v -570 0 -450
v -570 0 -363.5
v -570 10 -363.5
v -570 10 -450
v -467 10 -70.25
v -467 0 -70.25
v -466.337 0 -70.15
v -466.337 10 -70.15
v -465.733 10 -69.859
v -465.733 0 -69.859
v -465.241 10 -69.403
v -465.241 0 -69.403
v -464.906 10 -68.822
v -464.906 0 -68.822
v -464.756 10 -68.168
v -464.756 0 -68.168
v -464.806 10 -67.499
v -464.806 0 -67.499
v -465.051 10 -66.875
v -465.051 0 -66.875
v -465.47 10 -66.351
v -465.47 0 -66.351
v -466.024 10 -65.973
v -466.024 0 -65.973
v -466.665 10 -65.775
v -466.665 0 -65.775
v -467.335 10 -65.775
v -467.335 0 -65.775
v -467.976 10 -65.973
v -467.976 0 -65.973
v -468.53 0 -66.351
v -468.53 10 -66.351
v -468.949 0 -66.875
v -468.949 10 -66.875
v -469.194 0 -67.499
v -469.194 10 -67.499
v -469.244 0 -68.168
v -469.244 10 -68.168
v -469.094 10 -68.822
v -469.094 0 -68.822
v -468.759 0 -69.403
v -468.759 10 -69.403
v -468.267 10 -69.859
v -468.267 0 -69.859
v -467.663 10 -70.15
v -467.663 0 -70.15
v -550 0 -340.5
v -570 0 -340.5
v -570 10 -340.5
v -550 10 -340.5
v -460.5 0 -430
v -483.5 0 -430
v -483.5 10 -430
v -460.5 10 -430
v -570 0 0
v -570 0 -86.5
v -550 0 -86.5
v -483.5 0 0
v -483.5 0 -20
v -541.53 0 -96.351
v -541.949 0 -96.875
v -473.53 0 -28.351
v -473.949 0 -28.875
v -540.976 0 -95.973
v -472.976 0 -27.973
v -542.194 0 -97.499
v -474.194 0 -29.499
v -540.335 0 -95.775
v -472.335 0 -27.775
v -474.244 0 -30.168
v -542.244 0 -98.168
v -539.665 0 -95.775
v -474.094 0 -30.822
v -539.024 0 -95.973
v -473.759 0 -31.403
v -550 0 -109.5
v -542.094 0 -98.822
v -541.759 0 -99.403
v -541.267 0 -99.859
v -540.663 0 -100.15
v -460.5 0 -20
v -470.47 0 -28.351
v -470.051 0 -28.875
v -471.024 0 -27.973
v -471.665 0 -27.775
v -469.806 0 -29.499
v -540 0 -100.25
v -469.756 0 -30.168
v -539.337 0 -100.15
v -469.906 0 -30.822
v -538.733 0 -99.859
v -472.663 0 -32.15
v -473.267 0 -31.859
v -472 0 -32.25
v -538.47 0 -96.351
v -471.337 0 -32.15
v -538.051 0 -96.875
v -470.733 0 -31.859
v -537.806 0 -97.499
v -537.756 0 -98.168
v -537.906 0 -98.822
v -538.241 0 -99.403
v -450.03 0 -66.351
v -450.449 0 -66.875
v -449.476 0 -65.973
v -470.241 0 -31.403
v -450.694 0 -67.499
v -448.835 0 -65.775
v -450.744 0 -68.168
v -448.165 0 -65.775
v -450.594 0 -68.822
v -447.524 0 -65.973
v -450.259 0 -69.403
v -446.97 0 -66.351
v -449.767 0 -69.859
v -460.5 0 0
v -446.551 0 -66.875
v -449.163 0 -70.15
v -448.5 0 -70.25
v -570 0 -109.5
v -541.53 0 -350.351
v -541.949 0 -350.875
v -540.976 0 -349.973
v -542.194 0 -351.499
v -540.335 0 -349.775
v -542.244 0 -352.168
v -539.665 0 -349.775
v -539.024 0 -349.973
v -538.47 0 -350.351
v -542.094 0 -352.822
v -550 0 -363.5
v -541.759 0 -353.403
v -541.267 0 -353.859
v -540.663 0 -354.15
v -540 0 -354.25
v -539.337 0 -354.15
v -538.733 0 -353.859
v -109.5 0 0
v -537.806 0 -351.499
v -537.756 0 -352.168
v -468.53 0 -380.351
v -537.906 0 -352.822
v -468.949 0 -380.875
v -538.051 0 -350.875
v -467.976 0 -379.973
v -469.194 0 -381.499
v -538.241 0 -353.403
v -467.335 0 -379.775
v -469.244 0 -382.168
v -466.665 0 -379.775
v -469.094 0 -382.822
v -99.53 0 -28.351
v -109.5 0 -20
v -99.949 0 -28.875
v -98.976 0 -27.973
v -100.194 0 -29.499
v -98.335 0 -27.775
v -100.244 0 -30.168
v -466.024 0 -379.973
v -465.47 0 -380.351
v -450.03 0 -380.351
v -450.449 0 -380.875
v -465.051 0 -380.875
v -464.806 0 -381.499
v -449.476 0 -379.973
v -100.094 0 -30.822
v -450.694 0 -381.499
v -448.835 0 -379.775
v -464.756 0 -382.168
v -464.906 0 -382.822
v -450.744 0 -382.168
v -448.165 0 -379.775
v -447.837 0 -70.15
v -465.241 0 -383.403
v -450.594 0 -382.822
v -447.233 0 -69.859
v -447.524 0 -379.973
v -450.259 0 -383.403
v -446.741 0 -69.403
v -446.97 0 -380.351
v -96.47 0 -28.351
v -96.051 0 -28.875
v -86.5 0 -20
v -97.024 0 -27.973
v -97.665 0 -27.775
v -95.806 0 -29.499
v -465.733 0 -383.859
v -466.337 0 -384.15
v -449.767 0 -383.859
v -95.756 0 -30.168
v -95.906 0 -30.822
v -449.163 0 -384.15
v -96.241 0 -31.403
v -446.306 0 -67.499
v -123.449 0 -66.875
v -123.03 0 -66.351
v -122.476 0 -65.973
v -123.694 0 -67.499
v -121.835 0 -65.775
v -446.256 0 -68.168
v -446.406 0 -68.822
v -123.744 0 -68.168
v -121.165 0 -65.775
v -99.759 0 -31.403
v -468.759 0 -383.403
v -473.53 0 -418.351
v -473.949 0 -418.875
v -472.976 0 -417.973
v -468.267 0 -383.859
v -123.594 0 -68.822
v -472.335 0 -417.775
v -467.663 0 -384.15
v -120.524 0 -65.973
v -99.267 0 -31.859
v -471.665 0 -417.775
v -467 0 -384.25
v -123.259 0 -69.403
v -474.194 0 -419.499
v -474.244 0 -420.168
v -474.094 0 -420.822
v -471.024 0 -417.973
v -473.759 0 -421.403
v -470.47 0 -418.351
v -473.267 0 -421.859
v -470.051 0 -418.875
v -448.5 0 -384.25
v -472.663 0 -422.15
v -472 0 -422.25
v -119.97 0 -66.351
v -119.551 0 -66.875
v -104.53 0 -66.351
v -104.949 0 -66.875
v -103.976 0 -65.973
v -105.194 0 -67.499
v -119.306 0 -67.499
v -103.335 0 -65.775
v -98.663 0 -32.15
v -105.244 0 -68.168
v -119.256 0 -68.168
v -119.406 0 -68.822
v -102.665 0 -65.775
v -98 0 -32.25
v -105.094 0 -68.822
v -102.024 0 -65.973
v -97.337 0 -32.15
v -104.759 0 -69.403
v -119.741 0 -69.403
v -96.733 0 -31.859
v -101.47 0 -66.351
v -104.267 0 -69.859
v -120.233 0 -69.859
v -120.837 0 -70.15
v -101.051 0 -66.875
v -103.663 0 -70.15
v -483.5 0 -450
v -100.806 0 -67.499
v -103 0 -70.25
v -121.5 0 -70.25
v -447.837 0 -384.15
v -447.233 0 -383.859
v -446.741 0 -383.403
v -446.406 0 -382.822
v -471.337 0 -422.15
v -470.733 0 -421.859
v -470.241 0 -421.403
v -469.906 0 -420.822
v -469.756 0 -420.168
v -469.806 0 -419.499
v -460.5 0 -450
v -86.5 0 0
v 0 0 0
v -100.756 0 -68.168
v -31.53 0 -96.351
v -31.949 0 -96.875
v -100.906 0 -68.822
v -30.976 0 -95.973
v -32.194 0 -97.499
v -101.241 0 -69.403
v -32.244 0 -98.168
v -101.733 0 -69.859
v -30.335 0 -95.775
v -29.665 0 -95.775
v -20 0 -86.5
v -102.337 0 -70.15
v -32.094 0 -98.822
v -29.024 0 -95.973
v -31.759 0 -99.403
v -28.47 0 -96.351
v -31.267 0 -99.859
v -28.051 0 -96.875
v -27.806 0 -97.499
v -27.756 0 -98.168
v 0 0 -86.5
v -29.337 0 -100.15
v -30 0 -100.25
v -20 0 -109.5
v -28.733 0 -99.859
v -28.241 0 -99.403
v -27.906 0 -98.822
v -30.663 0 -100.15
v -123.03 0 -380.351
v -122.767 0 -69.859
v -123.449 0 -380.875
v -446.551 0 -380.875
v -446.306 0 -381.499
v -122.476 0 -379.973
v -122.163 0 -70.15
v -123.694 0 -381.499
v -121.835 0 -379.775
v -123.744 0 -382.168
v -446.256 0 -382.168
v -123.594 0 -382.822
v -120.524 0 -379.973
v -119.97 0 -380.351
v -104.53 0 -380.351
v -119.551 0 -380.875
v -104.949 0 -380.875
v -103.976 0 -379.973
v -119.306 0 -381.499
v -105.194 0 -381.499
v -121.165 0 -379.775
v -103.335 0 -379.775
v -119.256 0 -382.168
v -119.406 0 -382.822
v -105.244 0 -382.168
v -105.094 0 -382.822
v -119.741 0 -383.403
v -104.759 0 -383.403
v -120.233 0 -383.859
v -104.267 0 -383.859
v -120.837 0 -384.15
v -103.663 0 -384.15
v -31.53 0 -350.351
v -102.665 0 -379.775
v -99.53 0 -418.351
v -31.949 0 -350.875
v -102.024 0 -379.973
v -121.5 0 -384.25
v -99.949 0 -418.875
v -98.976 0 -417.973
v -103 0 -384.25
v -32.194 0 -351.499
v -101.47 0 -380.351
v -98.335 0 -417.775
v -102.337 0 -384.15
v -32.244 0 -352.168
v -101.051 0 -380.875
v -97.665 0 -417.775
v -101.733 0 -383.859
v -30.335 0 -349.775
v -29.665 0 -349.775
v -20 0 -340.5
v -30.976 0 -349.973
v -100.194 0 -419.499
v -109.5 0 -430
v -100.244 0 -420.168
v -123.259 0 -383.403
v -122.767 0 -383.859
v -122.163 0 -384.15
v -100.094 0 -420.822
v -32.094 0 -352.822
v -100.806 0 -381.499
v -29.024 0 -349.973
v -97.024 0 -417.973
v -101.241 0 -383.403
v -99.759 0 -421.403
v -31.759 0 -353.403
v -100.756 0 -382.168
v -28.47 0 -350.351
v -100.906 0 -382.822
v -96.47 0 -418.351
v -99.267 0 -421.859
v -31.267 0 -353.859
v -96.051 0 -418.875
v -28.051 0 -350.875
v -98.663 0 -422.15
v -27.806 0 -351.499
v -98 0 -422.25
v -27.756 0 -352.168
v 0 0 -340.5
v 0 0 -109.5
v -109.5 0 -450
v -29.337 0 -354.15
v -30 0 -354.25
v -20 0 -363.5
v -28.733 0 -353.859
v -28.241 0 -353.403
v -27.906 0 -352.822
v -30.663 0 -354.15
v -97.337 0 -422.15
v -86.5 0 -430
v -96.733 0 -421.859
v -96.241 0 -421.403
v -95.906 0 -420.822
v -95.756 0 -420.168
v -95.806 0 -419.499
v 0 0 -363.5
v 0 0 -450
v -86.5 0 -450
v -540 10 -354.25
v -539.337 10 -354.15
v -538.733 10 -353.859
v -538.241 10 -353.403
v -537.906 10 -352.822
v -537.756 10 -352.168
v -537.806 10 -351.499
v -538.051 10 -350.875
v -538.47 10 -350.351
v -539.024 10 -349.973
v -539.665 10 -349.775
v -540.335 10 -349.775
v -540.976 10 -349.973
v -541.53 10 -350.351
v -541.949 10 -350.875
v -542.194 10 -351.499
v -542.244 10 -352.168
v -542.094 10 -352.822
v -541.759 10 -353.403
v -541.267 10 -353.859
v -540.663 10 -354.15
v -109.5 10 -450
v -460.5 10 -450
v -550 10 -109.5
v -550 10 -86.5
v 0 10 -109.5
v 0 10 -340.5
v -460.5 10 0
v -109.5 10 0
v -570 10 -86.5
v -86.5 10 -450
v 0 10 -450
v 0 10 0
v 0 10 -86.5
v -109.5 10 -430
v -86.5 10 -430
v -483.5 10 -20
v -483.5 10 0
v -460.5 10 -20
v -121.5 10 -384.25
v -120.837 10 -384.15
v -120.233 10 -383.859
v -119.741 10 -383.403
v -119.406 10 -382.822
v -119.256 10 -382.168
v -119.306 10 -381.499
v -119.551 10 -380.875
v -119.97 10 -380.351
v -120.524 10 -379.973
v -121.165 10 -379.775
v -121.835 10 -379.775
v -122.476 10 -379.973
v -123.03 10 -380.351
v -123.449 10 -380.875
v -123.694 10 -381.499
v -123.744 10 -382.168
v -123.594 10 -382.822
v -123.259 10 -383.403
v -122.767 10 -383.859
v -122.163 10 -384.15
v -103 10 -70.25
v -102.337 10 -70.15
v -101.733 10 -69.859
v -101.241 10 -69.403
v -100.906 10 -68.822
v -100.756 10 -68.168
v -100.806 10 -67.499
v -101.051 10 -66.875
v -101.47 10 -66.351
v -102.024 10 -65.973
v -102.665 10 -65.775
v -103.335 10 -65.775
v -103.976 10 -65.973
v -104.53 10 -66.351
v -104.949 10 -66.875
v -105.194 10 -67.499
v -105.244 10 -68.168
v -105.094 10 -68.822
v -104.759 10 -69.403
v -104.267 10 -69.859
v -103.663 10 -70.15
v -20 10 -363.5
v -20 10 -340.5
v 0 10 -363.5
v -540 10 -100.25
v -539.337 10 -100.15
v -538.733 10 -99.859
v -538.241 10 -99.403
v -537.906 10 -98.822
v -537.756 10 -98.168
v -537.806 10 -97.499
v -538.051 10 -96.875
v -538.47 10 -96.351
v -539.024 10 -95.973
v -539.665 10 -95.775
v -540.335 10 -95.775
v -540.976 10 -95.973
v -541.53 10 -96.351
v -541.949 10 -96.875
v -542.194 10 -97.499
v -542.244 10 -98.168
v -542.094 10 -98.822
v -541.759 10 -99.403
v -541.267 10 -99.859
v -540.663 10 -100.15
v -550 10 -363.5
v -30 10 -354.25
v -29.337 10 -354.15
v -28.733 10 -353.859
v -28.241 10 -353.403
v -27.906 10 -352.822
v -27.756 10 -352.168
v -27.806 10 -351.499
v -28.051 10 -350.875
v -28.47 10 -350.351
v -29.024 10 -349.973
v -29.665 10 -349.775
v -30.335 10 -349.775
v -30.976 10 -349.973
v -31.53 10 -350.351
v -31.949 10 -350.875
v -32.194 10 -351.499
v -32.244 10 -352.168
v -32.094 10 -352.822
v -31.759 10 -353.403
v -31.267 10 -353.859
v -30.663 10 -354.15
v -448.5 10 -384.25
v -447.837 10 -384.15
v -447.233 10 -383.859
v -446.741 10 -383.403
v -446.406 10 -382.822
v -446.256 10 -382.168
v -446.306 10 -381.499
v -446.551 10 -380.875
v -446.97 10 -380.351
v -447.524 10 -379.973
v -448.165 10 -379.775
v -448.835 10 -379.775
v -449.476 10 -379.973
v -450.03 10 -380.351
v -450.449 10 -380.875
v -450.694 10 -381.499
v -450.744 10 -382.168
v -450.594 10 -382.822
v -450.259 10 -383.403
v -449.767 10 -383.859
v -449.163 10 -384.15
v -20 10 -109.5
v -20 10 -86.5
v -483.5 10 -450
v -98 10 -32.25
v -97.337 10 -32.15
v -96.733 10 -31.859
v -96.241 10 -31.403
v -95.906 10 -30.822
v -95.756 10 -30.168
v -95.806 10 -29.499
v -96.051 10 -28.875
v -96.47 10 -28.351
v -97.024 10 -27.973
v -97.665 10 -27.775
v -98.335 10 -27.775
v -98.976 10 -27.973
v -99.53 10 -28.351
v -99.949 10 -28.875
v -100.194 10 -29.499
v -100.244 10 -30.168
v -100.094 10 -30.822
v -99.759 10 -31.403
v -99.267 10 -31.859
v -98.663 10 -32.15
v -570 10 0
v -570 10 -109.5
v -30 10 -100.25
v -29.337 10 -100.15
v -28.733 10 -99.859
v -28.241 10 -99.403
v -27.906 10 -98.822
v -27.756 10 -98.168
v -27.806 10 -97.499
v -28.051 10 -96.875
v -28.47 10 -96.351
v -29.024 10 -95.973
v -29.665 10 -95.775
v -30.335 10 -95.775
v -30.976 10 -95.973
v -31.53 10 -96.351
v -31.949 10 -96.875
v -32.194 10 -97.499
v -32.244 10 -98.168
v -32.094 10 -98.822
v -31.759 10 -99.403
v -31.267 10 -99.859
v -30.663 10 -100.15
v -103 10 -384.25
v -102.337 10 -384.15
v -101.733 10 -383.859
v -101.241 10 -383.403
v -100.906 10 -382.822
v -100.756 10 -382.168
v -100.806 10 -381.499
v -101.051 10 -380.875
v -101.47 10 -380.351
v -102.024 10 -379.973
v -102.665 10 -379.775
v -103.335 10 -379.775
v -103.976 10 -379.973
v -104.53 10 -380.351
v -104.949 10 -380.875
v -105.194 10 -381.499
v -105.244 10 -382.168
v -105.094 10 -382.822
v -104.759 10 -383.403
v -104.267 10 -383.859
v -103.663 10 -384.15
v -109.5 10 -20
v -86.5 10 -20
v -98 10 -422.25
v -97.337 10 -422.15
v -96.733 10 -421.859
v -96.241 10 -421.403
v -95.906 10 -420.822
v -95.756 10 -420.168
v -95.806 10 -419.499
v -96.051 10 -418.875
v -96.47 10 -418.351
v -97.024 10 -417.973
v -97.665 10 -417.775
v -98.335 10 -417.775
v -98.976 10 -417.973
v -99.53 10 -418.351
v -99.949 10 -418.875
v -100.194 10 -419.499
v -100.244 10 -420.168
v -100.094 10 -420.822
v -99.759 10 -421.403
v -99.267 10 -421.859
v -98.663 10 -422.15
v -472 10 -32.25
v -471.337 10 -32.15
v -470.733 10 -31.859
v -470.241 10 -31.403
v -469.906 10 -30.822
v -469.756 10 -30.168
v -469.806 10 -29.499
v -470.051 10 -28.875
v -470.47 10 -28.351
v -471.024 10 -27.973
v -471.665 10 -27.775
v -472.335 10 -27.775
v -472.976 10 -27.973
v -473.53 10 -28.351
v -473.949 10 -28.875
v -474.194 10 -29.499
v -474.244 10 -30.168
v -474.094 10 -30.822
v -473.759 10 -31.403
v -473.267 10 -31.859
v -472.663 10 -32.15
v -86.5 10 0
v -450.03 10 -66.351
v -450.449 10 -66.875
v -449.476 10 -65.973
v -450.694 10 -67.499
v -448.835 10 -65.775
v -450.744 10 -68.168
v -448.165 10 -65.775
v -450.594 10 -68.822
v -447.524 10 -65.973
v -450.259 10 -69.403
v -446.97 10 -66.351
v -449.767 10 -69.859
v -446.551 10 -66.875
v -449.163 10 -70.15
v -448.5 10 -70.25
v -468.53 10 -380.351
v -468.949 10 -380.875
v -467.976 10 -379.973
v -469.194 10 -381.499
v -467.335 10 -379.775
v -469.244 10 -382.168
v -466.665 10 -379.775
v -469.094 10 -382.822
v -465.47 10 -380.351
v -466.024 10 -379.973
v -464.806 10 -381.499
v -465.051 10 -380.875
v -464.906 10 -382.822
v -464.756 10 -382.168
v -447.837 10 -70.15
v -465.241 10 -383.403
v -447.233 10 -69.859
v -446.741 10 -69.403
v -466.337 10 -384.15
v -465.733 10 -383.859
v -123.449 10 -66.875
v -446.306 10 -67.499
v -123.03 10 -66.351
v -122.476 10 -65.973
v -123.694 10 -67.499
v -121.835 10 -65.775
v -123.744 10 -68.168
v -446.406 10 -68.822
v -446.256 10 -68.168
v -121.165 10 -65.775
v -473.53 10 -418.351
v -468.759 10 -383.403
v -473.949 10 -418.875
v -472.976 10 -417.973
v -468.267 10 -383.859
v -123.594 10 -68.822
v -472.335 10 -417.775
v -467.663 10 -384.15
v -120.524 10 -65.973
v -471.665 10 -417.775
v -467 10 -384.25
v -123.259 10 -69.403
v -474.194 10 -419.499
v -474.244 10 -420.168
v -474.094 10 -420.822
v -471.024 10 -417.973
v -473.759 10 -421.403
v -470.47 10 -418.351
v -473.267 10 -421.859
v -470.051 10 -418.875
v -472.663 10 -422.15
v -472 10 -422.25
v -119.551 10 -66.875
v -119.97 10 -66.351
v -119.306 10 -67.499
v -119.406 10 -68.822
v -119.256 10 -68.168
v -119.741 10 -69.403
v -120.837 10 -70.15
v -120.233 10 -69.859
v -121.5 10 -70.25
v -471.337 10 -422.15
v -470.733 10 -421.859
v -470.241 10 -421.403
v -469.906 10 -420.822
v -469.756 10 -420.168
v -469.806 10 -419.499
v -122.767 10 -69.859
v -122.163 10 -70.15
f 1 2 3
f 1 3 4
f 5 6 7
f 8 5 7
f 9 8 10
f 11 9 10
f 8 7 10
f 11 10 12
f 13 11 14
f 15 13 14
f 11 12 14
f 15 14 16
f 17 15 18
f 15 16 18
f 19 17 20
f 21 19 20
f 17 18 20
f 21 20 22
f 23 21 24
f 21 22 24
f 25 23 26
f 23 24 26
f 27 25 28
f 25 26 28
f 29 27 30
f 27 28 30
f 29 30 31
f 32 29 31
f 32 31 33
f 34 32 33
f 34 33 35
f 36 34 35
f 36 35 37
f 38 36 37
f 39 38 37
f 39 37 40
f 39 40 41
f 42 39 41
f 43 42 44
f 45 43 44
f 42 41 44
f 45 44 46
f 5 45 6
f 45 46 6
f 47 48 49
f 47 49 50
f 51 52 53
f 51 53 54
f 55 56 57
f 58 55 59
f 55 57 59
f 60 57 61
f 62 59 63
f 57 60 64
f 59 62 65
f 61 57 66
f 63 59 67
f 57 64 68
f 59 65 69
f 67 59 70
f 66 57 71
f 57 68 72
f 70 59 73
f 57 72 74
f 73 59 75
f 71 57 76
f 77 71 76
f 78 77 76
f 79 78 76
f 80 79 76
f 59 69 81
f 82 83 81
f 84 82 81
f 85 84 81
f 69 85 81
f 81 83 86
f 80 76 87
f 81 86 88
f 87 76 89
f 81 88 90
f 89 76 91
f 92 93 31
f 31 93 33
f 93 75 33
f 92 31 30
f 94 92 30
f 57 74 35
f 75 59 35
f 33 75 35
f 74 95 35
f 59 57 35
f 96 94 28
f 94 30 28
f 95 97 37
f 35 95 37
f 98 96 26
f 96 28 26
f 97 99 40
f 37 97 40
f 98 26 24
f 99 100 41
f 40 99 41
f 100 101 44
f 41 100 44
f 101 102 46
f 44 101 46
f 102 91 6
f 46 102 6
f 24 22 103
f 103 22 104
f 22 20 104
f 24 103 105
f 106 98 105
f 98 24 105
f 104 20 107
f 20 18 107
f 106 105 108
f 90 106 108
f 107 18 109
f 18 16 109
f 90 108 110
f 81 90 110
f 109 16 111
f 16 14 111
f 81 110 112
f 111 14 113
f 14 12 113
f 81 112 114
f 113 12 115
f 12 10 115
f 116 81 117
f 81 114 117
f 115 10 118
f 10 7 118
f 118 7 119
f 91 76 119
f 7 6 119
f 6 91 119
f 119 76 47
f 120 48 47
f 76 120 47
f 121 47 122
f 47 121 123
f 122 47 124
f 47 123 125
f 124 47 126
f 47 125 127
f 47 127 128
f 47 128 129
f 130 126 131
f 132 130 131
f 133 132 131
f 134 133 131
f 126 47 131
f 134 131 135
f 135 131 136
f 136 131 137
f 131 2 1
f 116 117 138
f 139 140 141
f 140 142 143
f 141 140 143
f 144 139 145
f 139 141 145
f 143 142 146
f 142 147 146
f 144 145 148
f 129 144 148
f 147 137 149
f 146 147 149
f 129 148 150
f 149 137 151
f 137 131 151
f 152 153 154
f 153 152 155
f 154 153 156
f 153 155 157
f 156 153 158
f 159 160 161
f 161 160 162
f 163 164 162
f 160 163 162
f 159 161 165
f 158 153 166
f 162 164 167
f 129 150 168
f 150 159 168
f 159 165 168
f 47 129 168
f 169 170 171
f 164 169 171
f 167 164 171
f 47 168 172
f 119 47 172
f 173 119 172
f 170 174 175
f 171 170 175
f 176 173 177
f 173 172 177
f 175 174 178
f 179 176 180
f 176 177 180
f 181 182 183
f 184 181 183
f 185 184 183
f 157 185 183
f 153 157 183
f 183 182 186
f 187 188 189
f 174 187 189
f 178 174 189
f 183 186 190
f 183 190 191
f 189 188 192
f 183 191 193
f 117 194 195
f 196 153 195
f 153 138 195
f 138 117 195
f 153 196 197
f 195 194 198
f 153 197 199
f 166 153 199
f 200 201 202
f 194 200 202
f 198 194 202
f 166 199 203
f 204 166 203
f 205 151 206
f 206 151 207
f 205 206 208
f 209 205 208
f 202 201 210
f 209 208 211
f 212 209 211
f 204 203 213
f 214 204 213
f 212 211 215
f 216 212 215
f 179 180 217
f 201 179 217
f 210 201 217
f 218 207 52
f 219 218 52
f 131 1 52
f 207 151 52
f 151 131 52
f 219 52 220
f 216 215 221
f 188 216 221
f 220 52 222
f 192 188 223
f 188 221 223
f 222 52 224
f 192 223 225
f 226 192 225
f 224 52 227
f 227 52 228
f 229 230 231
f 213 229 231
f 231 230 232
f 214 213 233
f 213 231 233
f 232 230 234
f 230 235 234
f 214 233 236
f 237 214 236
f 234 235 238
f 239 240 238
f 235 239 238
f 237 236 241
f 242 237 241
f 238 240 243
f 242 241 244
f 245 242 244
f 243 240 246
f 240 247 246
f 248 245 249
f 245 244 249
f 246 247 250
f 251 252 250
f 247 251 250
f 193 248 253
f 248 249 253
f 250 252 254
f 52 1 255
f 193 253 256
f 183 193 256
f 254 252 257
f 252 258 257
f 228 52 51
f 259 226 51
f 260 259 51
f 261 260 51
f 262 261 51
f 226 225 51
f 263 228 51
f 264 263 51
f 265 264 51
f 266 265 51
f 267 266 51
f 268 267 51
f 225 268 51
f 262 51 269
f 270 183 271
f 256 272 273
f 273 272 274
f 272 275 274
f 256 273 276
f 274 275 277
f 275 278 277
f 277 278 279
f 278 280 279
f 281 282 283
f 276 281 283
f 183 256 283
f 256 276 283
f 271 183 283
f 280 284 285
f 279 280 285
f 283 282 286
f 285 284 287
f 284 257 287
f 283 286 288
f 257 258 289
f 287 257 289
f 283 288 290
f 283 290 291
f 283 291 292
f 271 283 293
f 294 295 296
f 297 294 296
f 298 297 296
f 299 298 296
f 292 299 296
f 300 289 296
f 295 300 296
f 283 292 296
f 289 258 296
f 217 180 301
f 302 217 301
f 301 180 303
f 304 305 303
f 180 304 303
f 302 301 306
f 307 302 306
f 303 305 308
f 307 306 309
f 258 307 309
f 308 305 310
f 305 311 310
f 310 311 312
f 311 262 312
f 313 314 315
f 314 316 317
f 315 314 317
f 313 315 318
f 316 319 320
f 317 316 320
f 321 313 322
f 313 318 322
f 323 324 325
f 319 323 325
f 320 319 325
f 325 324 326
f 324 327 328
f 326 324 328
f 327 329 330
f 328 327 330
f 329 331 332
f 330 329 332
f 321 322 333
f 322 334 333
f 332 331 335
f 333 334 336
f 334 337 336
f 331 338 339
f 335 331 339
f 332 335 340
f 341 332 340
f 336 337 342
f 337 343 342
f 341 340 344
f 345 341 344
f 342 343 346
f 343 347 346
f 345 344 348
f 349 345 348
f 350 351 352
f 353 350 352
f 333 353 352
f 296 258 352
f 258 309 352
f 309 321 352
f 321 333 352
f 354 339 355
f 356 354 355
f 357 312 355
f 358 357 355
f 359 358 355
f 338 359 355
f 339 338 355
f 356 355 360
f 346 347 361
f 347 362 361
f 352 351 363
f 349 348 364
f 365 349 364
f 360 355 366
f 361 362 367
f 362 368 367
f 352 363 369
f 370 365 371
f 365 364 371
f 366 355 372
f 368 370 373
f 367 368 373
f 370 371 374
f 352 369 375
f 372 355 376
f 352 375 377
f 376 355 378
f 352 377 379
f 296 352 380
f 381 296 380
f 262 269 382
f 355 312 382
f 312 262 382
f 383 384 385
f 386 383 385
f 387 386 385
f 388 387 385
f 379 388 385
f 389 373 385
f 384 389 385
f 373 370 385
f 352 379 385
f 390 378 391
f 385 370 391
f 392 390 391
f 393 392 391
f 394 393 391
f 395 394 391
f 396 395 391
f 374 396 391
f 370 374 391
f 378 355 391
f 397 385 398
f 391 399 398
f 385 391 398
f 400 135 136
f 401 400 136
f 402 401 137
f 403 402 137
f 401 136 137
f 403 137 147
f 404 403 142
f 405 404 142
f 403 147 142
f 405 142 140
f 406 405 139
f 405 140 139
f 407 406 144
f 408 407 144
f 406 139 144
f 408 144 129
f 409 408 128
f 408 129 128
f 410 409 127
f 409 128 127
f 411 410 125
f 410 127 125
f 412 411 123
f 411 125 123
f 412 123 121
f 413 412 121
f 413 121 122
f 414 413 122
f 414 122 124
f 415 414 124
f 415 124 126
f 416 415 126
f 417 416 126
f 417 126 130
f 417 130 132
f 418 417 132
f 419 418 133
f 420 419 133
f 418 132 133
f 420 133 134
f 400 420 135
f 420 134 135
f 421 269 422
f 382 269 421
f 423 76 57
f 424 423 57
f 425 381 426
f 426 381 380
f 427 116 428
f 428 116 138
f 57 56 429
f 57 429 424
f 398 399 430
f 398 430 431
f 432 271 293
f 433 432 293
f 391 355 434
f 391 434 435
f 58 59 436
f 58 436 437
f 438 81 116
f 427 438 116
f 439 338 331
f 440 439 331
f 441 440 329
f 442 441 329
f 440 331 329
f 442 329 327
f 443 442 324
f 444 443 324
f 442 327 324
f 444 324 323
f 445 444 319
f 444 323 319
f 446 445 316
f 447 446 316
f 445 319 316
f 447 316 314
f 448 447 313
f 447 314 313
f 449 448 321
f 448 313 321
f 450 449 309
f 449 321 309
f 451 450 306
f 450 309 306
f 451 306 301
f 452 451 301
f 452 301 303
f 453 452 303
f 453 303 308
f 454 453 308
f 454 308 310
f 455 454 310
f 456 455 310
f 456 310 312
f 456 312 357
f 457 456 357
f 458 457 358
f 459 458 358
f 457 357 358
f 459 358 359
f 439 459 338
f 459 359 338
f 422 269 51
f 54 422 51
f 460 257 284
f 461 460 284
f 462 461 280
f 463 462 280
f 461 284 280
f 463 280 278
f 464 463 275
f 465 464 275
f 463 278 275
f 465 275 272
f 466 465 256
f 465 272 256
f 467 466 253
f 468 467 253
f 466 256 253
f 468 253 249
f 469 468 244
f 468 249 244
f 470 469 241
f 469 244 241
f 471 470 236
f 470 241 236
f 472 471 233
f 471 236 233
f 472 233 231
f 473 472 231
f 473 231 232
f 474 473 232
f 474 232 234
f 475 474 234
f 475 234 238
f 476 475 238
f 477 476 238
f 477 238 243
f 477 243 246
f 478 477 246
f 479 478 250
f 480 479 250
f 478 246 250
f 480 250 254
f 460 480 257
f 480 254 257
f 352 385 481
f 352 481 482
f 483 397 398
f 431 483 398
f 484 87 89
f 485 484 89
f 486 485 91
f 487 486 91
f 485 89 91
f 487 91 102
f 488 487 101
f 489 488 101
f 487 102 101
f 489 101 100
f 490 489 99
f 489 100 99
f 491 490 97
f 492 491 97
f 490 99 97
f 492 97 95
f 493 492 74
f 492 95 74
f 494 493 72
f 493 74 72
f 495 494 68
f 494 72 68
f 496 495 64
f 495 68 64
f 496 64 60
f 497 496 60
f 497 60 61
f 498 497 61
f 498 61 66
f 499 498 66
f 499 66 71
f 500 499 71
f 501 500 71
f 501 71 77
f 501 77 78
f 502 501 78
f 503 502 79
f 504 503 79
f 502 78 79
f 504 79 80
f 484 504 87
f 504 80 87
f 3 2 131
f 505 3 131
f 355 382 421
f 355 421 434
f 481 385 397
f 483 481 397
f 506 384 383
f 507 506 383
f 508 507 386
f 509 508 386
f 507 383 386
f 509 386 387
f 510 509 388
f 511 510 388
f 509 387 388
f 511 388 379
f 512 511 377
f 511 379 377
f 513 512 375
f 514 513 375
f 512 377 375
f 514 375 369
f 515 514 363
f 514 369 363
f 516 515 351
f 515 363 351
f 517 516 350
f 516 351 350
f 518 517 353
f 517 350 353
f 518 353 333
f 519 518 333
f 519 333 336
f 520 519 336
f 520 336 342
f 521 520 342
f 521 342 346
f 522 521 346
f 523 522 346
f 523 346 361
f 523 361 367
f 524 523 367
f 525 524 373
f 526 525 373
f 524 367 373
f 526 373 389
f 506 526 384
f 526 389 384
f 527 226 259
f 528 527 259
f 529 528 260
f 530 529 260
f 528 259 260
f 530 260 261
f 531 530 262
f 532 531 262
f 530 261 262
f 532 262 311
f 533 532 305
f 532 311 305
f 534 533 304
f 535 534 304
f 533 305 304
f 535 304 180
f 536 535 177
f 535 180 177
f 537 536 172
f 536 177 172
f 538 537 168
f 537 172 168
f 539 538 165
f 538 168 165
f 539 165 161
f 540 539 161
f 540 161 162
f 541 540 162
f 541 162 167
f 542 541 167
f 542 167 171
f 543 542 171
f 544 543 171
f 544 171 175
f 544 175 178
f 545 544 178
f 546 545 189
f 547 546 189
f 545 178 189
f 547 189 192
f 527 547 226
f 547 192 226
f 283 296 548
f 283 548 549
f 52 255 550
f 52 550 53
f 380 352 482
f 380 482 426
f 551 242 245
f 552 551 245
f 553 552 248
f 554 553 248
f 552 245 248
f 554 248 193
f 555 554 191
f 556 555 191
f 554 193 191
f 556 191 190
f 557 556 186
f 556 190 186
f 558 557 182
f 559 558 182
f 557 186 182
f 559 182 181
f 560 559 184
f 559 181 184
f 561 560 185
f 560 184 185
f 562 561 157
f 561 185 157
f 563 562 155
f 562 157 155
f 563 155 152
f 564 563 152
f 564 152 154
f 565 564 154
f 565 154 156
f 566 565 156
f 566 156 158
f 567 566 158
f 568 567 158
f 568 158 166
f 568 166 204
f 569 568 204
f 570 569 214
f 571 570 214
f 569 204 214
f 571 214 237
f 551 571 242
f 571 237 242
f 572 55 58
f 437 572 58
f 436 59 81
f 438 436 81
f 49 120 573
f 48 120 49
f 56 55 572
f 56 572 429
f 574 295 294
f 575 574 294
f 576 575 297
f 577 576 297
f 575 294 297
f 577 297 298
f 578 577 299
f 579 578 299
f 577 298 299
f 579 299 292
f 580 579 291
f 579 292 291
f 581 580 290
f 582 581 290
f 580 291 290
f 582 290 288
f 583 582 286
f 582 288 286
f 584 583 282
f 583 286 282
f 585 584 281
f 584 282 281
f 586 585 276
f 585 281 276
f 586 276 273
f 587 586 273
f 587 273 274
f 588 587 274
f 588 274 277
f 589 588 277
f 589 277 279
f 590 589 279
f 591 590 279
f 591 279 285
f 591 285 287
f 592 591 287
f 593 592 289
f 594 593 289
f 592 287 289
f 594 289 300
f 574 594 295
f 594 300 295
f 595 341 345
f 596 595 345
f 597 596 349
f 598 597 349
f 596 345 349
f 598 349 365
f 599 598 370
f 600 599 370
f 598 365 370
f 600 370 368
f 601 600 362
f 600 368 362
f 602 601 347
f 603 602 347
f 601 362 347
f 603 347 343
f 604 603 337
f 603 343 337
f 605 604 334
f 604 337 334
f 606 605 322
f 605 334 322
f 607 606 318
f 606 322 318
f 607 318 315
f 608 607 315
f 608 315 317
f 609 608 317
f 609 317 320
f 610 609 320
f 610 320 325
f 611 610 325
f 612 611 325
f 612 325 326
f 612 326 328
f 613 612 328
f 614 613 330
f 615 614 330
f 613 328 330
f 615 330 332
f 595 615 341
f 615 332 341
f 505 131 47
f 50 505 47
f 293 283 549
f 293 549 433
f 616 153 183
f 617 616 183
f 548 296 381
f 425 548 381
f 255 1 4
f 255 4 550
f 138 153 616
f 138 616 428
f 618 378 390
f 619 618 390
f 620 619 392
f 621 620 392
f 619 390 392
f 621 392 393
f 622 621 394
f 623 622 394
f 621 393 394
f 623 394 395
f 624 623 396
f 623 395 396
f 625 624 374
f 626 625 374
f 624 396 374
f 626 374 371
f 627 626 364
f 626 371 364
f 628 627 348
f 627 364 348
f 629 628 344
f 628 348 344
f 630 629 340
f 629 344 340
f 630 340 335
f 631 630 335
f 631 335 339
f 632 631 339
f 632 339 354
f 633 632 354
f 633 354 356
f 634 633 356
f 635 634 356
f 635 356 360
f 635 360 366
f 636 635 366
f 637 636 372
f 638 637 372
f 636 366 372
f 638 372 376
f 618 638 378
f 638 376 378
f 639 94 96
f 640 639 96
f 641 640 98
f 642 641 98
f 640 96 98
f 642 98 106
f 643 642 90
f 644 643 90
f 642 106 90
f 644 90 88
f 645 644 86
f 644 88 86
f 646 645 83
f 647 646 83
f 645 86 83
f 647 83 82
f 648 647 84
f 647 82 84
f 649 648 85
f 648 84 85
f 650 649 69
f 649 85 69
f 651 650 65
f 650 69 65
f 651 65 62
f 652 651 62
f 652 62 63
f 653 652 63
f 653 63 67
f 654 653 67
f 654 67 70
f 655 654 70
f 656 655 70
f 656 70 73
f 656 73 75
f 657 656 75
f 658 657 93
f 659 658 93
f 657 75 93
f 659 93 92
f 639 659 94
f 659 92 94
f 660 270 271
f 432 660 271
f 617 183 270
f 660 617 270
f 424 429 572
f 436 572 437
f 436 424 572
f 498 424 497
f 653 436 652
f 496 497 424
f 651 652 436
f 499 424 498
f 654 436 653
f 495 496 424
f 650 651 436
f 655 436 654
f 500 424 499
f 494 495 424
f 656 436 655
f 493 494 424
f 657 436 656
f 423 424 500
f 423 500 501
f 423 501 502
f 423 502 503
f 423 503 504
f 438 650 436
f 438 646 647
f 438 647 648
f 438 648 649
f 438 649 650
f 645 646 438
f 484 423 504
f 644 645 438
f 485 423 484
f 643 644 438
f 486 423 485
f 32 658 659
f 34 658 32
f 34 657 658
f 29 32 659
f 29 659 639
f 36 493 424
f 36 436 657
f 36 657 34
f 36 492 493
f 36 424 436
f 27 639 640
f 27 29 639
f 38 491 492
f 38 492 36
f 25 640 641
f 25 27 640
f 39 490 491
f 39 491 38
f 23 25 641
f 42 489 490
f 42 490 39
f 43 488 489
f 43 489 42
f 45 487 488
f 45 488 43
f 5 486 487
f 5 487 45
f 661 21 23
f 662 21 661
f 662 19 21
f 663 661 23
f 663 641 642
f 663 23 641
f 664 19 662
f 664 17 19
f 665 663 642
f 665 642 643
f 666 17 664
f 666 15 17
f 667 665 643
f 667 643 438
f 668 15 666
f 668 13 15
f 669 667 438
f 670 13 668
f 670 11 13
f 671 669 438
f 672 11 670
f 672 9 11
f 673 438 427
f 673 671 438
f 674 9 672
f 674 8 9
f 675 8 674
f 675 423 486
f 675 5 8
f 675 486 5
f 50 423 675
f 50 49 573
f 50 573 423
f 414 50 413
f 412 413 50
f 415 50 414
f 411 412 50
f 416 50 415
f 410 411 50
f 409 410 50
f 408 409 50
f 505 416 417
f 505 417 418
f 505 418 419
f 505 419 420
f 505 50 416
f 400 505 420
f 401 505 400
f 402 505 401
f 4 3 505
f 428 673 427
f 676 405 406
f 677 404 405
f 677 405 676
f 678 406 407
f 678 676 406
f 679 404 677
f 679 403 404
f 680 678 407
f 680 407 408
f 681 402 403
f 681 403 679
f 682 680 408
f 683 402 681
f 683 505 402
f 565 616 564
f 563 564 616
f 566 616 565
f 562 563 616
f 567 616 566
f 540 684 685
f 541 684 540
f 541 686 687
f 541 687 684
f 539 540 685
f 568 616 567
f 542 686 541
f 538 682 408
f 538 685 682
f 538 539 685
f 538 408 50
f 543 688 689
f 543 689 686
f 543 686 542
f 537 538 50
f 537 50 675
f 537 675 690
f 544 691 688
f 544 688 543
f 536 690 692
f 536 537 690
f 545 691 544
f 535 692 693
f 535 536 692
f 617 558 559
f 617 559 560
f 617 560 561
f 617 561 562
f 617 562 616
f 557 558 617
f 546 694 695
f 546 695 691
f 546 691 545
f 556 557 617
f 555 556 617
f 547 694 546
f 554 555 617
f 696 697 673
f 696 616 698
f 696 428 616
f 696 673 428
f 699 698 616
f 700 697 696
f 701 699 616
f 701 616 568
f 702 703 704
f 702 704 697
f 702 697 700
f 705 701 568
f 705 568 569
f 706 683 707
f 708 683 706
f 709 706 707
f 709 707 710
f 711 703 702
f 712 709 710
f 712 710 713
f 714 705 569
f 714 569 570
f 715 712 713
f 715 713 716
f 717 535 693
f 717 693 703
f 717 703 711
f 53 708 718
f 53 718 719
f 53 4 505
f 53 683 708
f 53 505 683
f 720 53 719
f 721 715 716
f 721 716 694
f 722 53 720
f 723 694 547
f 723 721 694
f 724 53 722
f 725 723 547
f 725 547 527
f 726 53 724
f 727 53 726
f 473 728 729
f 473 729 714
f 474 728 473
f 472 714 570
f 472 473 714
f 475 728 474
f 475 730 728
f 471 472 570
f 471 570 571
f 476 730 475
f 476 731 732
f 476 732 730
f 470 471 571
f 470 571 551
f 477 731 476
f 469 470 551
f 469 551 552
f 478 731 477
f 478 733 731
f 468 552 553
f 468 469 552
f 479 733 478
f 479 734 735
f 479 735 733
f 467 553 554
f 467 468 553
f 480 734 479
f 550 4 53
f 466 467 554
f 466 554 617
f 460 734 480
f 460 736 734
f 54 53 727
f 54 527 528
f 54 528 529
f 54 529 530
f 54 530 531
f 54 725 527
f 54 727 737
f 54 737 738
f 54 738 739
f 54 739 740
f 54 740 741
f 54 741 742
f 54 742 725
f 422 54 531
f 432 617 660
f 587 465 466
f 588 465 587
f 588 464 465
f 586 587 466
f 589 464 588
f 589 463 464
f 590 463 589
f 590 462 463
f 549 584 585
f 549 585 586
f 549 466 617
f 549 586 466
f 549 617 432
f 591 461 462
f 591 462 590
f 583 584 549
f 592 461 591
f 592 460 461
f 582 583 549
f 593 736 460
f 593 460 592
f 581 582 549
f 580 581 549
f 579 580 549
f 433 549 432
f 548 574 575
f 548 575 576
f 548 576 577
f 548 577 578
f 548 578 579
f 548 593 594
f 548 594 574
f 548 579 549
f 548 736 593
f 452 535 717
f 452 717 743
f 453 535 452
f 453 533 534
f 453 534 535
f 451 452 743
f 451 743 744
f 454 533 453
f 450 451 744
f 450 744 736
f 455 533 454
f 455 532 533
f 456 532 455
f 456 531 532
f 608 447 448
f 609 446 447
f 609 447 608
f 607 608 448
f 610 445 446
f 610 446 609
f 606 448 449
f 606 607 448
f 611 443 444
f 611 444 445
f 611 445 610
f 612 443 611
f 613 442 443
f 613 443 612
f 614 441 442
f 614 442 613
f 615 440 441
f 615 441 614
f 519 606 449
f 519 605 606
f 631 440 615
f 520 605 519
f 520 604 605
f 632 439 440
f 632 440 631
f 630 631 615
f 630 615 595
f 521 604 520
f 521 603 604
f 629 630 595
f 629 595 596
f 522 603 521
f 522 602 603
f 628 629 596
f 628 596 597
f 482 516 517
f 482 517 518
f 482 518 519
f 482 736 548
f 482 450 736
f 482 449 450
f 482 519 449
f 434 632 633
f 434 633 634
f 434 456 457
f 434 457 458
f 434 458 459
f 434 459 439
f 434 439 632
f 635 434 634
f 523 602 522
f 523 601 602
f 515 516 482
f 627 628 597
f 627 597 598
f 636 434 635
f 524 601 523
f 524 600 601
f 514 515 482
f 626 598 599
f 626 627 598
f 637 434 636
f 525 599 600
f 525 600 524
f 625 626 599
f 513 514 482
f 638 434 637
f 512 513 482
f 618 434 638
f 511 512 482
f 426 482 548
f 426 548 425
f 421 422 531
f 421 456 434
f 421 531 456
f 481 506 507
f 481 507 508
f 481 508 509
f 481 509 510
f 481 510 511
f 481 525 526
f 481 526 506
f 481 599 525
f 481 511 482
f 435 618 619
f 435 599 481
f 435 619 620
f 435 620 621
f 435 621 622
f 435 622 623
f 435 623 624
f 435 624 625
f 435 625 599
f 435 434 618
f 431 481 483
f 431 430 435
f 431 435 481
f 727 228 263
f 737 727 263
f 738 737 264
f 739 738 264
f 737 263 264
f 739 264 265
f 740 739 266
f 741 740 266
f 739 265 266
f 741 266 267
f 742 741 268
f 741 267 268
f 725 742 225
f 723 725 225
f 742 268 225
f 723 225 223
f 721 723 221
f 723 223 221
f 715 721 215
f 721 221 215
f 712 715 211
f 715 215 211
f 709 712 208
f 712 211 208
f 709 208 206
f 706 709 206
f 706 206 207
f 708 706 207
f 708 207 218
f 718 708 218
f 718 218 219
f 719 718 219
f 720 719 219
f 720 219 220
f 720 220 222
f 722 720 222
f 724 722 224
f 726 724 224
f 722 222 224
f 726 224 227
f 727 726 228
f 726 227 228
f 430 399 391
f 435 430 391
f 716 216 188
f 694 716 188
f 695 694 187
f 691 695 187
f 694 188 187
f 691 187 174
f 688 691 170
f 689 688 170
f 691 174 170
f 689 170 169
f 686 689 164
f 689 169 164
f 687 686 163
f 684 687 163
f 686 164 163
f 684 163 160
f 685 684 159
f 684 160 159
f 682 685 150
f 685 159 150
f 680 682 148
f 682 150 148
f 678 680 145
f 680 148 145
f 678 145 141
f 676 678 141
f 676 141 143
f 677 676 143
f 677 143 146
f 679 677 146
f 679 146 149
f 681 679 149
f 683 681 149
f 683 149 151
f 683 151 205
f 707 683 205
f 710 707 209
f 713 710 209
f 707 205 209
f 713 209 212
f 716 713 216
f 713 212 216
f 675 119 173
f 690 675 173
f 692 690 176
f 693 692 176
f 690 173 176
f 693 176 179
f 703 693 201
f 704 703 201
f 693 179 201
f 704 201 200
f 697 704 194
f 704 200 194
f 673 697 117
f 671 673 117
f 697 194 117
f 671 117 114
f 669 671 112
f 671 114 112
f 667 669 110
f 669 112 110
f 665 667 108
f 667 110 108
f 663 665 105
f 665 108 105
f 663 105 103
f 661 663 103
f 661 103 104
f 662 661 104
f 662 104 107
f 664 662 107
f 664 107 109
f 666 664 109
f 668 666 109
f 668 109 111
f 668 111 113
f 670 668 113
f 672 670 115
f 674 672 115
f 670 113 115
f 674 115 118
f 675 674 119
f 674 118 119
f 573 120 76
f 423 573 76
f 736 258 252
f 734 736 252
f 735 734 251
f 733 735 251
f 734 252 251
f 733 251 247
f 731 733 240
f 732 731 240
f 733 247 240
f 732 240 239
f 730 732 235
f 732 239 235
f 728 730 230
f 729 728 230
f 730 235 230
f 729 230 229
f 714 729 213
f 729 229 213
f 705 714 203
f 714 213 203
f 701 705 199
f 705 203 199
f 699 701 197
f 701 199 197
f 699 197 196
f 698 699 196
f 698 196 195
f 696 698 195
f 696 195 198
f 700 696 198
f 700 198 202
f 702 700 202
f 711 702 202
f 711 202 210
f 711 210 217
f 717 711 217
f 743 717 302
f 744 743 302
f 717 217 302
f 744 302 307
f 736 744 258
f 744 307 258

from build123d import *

# Parameters (mm, degrees)
SCHIZZO1_W                   = 570
SCHIZZO1_H                   = 450
ESTRUSIONE_ESTRUSIONE1_DEPTH = 10
SCHIZZO2_R                   = 2.25
SCHIZZO2_W                   = 23
SCHIZZO2_H                   = 20
SCHIZZO2_W_2                 = 20
SCHIZZO2_H_2                 = 23
TAGLIO_ESTRUSIONE1_DEPTH     = 10


with BuildPart() as part:
    # Schizzo1 → Estrusione-Estrusione1 (new body)
    with BuildSketch(Plane(origin=(0, 0, 0), x_dir=(1, 0, 0), z_dir=(0, 1, 0))):
        with Locations((-285, 225)):
            Rectangle(SCHIZZO1_W, SCHIZZO1_H)
    extrude(amount=ESTRUSIONE_ESTRUSIONE1_DEPTH)

    # Schizzo2 → Taglio-Estrusione1 (cut)
    with BuildSketch(Plane.XZ):
        with Locations(Location((-467, -68, 0), (0, 0, 270))):
            Circle(SCHIZZO2_R)
        with Locations(Location((-448.5, -68, 0), (0, 0, 270))):
            Circle(SCHIZZO2_R)
        with Locations(Location((-121.5, -68, 0), (0, 0, 270))):
            Circle(SCHIZZO2_R)
        with Locations(Location((-103, -68, 0), (0, 0, 270))):
            Circle(SCHIZZO2_R)
        with Locations(Location((-467, -382, 0), (0, 0, 270))):
            Circle(SCHIZZO2_R)
        with Locations(Location((-448.5, -382, 0), (0, 0, 270))):
            Circle(SCHIZZO2_R)
        with Locations(Location((-121.5, -382, 0), (0, 0, 270))):
            Circle(SCHIZZO2_R)
        with Locations(Location((-103, -382, 0), (0, 0, 270))):
            Circle(SCHIZZO2_R)
        with Locations(Location((-472, -420, 0), (0, 0, 270))):
            Circle(SCHIZZO2_R)
        with Locations(Location((-540, -352, 0), (0, 0, 270))):
            Circle(SCHIZZO2_R)
        with Locations(Location((-540, -98, 0), (0, 0, 270))):
            Circle(SCHIZZO2_R)
        with Locations(Location((-472, -30, 0), (0, 0, 270))):
            Circle(SCHIZZO2_R)
        with Locations(Location((-98, -30, 0), (0, 0, 270))):
            Circle(SCHIZZO2_R)
        with Locations(Location((-30, -98, 0), (0, 0, 270))):
            Circle(SCHIZZO2_R)
        with Locations(Location((-30, -352, 0), (0, 0, 270))):
            Circle(SCHIZZO2_R)
        with Locations(Location((-98, -420, 0), (0, 0, 270))):
            Circle(SCHIZZO2_R)
        with Locations((-472, -10)):
            Rectangle(SCHIZZO2_W, SCHIZZO2_H)
        with Locations((-98, -10)):
            Rectangle(SCHIZZO2_W, SCHIZZO2_H)
        with Locations((-10, -98)):
            Rectangle(SCHIZZO2_W_2, SCHIZZO2_H_2)
        with Locations((-10, -352)):
            Rectangle(SCHIZZO2_W_2, SCHIZZO2_H_2)
        with Locations((-98, -440)):
            Rectangle(SCHIZZO2_W, SCHIZZO2_H)
        with Locations((-472, -440)):
            Rectangle(SCHIZZO2_W, SCHIZZO2_H)
        with Locations((-560, -352)):
            Rectangle(SCHIZZO2_W_2, SCHIZZO2_H_2)
        with Locations((-560, -98)):
            Rectangle(SCHIZZO2_W_2, SCHIZZO2_H_2)
    extrude(amount=-TAGLIO_ESTRUSIONE1_DEPTH, mode=Mode.SUBTRACT)


solid = part.part
